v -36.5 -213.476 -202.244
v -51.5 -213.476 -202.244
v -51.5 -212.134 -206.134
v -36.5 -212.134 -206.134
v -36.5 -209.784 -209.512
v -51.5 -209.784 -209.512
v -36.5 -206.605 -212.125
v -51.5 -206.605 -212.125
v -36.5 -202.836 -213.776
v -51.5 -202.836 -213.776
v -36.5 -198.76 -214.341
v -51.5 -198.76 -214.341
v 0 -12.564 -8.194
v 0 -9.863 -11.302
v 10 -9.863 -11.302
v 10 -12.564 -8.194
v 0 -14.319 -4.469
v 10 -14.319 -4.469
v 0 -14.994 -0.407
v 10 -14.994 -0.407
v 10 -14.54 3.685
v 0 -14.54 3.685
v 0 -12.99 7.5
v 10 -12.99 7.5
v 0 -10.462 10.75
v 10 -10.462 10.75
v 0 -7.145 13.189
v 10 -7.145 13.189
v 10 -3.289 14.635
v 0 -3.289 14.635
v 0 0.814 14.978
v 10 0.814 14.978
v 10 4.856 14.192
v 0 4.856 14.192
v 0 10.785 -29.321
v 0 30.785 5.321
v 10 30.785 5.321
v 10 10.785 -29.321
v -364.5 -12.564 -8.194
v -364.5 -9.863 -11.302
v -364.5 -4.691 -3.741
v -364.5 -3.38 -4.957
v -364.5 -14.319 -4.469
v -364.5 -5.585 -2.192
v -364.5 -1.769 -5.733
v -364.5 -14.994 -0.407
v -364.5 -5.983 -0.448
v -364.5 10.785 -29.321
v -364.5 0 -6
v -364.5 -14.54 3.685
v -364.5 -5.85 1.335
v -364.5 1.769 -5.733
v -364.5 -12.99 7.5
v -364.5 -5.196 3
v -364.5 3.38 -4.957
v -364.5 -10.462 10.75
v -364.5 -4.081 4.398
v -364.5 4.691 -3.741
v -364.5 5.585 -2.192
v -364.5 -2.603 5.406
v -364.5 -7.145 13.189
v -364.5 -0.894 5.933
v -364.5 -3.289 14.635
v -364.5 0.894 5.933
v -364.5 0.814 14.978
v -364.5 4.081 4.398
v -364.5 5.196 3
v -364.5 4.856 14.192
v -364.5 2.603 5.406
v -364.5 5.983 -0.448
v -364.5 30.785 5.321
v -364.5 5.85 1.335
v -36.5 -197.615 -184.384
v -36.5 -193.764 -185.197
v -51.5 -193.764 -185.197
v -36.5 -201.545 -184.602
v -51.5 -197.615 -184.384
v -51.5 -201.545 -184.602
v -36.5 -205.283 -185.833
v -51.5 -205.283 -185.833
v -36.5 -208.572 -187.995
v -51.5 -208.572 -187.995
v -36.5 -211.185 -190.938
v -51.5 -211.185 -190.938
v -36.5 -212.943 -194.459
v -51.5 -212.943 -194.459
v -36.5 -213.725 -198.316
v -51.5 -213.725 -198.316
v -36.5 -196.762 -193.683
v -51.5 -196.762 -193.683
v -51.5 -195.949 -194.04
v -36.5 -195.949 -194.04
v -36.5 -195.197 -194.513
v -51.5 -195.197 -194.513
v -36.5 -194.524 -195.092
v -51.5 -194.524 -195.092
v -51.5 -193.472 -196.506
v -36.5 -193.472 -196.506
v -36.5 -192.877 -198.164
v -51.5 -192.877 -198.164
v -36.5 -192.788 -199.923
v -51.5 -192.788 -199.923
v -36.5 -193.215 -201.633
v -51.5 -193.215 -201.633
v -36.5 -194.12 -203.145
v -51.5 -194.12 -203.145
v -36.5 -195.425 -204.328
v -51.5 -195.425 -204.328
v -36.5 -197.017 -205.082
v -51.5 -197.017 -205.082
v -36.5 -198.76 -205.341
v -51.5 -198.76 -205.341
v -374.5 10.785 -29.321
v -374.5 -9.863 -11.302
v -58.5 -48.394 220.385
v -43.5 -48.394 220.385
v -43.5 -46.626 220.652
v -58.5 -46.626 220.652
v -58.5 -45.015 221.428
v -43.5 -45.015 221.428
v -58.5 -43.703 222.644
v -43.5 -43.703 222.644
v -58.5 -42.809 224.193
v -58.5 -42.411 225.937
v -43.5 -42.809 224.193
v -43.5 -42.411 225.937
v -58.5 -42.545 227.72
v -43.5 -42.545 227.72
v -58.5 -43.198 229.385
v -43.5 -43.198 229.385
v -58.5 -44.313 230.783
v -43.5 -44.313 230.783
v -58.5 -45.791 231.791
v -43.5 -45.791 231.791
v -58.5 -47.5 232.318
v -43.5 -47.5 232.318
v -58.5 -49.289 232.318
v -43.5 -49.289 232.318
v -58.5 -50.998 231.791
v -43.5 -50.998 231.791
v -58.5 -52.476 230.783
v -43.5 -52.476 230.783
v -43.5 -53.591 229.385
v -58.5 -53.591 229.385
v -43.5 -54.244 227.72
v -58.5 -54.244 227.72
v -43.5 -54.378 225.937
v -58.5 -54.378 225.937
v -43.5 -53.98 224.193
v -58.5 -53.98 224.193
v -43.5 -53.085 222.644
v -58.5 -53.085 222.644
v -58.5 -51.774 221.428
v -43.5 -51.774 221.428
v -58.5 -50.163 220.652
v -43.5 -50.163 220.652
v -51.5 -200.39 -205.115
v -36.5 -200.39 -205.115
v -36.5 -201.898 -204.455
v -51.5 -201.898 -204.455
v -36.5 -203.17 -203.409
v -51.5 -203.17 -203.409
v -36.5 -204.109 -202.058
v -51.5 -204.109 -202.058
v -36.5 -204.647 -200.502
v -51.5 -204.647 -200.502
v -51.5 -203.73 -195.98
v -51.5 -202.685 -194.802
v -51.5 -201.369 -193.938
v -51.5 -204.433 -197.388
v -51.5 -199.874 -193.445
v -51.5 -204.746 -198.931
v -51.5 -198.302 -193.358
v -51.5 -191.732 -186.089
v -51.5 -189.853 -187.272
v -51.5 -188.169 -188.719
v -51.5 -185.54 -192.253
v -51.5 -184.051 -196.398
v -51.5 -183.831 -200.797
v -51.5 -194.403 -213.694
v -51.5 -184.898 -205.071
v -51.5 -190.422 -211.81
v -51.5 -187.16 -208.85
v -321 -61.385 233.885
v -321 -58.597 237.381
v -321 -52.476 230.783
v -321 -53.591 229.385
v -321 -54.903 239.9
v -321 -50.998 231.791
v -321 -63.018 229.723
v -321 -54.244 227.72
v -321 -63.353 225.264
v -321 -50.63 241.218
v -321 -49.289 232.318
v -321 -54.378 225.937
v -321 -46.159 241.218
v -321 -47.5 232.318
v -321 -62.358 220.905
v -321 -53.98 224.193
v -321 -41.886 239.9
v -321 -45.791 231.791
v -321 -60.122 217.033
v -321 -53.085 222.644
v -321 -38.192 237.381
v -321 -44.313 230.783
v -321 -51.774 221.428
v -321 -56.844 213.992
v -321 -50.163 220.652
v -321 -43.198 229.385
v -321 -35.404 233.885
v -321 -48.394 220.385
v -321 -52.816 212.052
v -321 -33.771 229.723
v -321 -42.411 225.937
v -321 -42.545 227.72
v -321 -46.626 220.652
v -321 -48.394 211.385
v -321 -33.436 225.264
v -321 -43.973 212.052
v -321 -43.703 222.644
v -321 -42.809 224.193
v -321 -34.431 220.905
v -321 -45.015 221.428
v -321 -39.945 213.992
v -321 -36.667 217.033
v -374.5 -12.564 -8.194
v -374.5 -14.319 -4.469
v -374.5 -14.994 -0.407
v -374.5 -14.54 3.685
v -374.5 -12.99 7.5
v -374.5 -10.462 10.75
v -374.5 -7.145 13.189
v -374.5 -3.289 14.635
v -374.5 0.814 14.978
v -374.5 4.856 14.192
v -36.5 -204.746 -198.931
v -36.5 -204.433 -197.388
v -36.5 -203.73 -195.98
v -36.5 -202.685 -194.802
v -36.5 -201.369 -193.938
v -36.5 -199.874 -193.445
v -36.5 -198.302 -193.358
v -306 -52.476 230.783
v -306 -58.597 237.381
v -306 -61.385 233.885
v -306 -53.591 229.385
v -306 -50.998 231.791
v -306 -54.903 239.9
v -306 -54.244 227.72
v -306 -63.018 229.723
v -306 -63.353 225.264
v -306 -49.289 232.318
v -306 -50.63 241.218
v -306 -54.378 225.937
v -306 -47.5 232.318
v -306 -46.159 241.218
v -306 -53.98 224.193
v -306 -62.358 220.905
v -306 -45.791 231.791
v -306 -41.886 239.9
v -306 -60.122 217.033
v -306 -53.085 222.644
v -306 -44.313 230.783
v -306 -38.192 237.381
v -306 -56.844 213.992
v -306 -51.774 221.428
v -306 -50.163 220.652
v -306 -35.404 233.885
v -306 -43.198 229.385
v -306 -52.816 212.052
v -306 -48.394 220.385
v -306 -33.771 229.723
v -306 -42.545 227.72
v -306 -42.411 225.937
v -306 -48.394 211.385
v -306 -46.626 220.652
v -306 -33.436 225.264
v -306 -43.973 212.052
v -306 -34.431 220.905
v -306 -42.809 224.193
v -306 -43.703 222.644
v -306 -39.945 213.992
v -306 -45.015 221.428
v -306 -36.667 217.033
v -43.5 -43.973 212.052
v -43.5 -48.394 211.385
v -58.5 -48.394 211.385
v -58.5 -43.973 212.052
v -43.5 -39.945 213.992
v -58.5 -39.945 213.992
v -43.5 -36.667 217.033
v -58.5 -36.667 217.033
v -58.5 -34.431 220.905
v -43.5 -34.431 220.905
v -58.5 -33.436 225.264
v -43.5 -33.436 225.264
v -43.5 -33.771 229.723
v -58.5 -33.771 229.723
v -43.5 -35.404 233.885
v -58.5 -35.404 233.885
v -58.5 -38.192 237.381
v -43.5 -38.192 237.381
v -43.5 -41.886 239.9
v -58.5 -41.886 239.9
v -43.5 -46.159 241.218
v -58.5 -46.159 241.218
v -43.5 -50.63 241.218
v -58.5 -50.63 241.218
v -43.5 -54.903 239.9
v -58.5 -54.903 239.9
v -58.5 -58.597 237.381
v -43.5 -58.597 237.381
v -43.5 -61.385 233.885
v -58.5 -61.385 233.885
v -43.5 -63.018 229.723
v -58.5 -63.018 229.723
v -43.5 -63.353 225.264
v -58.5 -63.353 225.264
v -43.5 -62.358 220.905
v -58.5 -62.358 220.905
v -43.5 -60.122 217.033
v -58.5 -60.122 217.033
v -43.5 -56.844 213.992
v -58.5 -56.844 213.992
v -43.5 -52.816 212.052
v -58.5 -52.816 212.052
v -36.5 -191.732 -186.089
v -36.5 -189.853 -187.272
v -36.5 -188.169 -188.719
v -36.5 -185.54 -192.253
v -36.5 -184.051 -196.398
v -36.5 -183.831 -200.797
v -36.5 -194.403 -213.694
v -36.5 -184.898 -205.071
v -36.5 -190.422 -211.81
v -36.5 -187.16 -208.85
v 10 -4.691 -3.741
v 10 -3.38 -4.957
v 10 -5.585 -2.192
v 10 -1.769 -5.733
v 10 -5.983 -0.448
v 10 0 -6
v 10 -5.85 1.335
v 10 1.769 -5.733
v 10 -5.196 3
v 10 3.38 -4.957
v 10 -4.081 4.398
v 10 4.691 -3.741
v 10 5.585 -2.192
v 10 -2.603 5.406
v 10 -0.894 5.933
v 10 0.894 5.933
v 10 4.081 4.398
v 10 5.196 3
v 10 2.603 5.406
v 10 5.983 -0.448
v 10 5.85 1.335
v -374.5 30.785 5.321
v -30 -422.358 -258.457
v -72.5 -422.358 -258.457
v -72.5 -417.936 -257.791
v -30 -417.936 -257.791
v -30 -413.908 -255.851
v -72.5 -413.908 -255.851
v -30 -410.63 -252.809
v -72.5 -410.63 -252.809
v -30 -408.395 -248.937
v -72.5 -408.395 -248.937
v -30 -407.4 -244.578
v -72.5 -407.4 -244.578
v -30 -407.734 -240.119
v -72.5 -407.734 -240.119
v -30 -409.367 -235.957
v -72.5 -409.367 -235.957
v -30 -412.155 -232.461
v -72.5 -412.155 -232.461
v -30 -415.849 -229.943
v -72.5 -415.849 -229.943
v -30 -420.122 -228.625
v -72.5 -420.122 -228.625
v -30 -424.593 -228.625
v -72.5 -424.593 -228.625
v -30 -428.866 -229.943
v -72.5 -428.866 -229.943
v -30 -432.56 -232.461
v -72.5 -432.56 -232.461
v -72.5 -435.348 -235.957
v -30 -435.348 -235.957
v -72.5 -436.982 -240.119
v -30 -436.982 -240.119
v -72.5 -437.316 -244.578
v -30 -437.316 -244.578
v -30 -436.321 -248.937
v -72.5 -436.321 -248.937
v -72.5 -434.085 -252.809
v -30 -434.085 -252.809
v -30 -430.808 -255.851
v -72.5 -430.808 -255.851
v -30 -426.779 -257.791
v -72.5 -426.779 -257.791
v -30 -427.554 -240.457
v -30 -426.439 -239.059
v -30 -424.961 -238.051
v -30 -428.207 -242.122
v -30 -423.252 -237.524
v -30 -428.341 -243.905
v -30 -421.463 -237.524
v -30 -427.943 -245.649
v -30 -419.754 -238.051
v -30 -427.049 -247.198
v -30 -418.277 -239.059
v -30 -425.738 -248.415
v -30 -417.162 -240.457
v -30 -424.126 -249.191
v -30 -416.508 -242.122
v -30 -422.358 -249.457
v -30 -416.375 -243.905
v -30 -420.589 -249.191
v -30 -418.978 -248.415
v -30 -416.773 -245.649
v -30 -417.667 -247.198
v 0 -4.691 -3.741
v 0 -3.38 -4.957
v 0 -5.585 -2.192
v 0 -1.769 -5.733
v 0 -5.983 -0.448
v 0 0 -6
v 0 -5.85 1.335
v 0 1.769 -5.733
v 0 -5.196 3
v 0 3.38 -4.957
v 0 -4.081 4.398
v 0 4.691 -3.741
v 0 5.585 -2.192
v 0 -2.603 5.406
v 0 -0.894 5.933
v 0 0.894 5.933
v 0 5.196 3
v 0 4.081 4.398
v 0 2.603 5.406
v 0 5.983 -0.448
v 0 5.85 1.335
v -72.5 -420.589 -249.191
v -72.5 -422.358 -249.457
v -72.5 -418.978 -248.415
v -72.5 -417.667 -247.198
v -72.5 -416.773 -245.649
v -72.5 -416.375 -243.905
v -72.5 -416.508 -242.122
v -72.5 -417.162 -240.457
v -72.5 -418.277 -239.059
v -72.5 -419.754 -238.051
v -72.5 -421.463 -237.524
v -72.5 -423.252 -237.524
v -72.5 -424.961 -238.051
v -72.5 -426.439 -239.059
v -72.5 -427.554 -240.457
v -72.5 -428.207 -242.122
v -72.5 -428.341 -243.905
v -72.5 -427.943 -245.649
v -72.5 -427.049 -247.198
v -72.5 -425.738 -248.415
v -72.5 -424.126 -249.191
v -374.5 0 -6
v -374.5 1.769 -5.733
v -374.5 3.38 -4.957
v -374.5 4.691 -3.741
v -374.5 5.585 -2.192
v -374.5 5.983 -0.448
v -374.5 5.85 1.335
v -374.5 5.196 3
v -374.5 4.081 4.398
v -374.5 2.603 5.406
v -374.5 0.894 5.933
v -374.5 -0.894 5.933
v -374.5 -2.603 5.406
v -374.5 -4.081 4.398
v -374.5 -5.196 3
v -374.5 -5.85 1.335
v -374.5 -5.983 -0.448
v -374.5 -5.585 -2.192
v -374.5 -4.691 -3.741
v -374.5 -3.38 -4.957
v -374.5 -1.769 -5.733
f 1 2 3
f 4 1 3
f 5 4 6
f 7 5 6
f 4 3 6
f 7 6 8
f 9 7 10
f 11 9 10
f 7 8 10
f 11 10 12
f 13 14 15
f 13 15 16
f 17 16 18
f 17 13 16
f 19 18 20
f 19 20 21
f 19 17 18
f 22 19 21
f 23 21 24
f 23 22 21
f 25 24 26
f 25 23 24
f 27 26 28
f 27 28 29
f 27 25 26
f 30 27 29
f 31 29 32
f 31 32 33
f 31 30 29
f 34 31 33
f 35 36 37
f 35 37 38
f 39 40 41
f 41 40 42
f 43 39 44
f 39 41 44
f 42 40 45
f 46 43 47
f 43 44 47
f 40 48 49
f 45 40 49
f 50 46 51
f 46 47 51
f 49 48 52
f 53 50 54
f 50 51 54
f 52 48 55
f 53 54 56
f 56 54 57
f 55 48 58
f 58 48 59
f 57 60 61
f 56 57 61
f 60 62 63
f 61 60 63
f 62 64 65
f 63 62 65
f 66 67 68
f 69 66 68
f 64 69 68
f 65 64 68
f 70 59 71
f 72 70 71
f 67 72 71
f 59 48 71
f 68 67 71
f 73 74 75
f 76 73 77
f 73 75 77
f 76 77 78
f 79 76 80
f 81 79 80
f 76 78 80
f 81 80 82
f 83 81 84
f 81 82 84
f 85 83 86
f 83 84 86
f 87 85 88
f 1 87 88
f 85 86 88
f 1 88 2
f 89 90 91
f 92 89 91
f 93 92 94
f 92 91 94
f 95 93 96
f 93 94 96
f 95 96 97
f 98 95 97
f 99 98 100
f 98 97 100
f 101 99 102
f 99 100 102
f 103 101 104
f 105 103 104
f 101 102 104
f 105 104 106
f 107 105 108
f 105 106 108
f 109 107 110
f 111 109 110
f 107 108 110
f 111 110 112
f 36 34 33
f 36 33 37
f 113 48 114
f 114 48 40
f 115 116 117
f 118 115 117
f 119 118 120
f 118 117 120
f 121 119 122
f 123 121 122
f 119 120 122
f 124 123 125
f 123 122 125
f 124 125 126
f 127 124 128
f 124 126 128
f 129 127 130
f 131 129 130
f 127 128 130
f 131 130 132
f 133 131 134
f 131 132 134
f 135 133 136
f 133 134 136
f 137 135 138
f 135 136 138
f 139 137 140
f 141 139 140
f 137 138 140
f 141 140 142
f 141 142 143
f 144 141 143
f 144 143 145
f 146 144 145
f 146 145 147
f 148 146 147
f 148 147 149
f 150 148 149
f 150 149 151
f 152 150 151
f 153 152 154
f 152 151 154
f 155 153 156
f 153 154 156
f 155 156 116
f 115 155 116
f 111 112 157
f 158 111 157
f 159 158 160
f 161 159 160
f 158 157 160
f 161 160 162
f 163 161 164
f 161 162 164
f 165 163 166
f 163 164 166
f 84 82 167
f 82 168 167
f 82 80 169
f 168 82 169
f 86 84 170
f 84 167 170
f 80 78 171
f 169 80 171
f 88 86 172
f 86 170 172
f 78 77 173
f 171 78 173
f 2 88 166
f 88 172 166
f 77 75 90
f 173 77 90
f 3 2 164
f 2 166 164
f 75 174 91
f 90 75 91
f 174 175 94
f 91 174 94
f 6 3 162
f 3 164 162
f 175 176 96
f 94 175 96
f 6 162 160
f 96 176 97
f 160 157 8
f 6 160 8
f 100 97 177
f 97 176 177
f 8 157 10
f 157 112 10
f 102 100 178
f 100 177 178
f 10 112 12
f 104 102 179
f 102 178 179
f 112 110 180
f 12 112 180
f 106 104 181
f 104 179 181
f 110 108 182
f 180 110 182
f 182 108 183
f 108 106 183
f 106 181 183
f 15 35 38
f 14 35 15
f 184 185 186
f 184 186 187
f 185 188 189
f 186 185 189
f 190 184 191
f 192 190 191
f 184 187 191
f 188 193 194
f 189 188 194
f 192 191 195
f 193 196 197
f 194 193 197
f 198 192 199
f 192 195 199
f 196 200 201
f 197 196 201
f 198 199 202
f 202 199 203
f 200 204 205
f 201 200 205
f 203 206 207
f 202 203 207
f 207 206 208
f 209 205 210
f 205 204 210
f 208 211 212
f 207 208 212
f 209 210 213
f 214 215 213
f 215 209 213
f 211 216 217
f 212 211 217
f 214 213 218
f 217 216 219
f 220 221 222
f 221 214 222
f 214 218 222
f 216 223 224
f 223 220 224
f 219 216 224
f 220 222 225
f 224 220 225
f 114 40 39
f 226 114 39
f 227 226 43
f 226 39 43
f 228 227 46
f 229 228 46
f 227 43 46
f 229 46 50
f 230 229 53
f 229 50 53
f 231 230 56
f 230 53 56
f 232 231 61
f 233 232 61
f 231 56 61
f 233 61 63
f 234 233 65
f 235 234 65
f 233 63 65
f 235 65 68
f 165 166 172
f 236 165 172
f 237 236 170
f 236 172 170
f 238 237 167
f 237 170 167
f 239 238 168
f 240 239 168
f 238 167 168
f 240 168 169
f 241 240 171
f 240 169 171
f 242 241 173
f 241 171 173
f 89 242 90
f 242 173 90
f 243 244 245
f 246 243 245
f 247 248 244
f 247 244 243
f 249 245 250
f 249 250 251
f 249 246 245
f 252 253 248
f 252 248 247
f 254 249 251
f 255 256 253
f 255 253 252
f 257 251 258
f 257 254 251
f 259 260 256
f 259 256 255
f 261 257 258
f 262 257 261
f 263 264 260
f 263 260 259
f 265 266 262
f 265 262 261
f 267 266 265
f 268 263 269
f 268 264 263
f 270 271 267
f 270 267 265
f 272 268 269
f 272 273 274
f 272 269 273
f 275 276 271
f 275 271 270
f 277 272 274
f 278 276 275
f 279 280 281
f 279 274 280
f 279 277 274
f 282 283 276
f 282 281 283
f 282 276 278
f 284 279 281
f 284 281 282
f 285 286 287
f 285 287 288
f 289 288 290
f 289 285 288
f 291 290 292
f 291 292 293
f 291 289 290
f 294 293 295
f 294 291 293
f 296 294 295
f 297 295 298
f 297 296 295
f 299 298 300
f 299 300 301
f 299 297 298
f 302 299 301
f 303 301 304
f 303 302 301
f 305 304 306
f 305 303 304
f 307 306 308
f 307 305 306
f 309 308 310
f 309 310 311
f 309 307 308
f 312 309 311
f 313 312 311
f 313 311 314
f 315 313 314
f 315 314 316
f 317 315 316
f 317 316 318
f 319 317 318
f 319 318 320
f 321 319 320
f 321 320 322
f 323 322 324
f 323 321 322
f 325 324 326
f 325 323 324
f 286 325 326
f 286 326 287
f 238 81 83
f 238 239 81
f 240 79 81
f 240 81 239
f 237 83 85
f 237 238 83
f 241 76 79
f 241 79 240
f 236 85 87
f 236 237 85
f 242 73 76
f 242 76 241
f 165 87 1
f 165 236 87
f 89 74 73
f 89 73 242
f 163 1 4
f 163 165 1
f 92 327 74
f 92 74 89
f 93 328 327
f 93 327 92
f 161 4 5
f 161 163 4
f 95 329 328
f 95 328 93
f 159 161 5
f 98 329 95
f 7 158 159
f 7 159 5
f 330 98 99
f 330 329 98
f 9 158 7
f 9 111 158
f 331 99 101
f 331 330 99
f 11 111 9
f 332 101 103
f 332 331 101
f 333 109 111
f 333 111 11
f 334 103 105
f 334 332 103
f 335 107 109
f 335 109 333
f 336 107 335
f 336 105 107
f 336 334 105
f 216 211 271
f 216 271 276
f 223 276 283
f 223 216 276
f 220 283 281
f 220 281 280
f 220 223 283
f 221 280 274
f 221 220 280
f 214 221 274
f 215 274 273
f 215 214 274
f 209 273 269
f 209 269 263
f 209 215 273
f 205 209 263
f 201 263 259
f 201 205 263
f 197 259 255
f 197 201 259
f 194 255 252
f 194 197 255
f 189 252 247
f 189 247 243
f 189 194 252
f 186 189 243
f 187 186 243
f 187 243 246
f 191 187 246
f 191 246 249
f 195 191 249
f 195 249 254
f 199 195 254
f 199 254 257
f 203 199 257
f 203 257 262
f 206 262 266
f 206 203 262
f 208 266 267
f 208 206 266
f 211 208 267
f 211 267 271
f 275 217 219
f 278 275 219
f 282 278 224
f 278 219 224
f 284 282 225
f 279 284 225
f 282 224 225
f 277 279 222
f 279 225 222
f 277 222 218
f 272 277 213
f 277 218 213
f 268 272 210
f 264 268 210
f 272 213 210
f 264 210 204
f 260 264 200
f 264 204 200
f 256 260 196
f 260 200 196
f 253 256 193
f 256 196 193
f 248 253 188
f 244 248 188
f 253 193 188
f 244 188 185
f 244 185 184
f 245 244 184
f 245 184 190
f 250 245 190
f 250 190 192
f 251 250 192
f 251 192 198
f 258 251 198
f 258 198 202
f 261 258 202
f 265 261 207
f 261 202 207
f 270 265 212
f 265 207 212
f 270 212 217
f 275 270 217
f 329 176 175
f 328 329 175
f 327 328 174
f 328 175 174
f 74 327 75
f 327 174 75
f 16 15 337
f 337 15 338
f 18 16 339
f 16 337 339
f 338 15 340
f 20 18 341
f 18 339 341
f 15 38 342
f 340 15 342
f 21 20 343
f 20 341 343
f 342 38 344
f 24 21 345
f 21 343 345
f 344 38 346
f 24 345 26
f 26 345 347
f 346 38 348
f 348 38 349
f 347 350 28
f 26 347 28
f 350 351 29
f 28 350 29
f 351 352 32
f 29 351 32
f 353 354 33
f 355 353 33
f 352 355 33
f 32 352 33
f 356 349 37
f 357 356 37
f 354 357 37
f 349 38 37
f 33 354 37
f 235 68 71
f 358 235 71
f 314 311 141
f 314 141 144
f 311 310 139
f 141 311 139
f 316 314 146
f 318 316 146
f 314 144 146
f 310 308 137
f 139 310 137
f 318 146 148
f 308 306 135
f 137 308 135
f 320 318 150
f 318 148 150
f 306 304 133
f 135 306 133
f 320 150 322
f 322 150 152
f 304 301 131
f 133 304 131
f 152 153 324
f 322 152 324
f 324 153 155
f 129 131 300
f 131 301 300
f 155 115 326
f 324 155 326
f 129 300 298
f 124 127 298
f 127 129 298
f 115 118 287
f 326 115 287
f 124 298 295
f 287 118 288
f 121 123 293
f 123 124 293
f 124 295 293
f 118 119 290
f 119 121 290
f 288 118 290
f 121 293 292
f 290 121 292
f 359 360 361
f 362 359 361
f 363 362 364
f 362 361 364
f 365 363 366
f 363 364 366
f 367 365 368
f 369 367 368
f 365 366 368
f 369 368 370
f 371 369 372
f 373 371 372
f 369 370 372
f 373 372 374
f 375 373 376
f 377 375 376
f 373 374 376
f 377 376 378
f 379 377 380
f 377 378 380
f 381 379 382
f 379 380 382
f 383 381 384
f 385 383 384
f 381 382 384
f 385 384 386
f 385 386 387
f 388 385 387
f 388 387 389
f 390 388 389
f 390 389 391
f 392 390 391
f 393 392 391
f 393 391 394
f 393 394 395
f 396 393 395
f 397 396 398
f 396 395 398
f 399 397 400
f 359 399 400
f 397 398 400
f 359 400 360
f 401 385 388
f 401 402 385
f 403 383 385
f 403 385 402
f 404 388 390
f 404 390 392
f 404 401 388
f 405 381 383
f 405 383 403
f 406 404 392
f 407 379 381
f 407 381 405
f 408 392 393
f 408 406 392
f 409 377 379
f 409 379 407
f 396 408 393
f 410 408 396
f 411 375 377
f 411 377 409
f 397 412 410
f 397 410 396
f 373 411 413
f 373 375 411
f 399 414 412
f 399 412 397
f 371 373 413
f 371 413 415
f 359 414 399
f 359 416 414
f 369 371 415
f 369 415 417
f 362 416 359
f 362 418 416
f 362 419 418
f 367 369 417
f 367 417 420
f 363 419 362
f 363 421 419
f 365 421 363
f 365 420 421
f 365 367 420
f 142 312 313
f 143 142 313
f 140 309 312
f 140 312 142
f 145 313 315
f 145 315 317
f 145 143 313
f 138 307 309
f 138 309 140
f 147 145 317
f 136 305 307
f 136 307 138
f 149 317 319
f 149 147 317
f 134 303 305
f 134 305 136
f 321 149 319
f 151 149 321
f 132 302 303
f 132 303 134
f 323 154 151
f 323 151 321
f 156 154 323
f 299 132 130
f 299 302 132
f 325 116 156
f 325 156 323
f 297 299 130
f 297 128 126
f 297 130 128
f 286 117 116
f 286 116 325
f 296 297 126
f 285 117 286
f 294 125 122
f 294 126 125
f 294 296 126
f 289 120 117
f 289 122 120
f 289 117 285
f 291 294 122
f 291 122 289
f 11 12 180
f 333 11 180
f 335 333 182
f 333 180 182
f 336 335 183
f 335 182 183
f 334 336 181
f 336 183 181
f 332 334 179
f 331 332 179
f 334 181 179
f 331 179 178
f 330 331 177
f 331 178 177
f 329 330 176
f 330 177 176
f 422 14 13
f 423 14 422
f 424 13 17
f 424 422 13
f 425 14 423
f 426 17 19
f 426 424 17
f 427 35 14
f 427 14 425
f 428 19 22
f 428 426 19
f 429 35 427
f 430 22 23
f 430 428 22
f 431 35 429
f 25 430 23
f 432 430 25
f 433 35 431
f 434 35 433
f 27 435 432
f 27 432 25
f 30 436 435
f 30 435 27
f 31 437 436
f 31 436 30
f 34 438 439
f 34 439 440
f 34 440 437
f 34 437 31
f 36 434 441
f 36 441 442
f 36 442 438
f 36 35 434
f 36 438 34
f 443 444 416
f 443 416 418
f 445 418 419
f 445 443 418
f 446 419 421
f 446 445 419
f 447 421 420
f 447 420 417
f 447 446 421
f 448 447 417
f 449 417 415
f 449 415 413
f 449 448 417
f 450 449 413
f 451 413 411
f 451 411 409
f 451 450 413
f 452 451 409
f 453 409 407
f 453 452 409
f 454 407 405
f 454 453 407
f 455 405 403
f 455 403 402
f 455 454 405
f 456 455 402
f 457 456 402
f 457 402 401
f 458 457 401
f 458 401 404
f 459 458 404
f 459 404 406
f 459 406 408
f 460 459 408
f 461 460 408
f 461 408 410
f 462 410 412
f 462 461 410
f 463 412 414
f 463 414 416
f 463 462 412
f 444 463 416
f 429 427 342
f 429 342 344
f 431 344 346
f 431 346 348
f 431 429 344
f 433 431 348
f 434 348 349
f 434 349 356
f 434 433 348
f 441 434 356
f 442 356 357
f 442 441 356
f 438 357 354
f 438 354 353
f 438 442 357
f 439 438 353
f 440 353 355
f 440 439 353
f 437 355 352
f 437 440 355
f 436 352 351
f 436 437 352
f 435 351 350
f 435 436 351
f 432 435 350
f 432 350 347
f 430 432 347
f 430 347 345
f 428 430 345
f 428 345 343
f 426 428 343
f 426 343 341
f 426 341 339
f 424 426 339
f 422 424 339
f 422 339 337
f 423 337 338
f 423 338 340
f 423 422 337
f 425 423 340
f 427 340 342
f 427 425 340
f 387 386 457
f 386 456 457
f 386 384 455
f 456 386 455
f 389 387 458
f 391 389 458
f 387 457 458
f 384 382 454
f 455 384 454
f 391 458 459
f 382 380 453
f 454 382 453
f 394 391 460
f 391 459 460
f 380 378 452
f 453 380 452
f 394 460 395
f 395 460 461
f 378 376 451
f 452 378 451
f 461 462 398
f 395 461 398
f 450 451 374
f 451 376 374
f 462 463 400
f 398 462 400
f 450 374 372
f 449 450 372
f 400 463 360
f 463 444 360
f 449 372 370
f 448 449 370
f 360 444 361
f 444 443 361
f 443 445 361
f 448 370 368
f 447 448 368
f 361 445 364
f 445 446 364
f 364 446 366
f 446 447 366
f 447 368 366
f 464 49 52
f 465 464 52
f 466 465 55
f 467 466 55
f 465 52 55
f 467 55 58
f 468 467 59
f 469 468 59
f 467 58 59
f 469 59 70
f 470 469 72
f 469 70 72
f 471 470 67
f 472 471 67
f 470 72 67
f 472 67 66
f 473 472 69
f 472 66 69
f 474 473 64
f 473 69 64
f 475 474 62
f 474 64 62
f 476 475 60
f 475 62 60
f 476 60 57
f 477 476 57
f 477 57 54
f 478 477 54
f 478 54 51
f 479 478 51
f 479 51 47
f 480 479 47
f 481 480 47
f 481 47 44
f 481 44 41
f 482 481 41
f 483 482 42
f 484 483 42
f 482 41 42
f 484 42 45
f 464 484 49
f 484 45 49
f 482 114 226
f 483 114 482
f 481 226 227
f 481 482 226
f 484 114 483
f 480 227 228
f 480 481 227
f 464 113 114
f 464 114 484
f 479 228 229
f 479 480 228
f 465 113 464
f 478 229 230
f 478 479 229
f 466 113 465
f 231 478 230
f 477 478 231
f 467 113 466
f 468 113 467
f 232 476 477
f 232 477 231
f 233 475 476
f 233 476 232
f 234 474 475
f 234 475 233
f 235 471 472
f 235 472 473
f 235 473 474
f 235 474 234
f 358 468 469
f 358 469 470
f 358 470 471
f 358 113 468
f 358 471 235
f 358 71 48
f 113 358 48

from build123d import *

# Parameters (mm, degrees)
SKETCH2_R           = 6
BOSS_EXTRUDE1_DEPTH = 10
SKETCH3_R           = 15
SKETCH3_R_2         = 6
BOSS_EXTRUDE2_DEPTH = 15
SKETCH5_R           = 15
SKETCH5_R_2         = 6
BOSS_EXTRUDE3_DEPTH = 42.5
BOSS_EXTRUDE4_DEPTH = 15


with BuildPart() as part:
    # Sketch2 → Boss-Extrude1 (new body)
    with BuildSketch(Plane(origin=(0, 0, 0), x_dir=(0, 0, -1), z_dir=(1, 0, 0))):
        with BuildLine():
            Line((-5.320508076, 30.784609691), (29.320508076, 10.784609691))
            Line((29.320508076, 10.784609691), (11.301534141, -9.862825461))
            ThreePointArc((11.301534141, -9.862825461), (-7.5, -12.990381057), (-14.192224472, 4.856002937))
            Line((-14.192224472, 4.856002937), (-5.320508076, 30.784609691))
        make_face()
        Circle(SKETCH2_R, mode=Mode.SUBTRACT)
    extrude(amount=BOSS_EXTRUDE1_DEPTH)


with BuildPart() as body_2:
    # Sketch3 → Boss-Extrude2 (new body)
    with BuildSketch(Plane(origin=(-43.5, 0, 0), x_dir=(0, 0, -1), z_dir=(1, 0, 0))):
        with Locations((-226.385122131, -48.394488094)):
            Circle(SKETCH3_R)
        with Locations((-226.385122131, -48.394488094)):
            Circle(SKETCH3_R_2, mode=Mode.SUBTRACT)
    extrude(amount=-BOSS_EXTRUDE2_DEPTH)


with BuildPart() as body_3:
    # Sketch5 → Boss-Extrude3 (new body)
    with BuildSketch(Plane(origin=(-72.5, 0, 0), x_dir=(0, 0, -1), z_dir=(1, 0, 0))):
        with Locations((243.45711943, -422.357745708)):
            Circle(SKETCH5_R)
        with Locations((243.45711943, -422.357745708)):
            Circle(SKETCH5_R_2, mode=Mode.SUBTRACT)
    extrude(amount=BOSS_EXTRUDE3_DEPTH)


with BuildPart() as body_4:
    # Sketch7 → Boss-Extrude4 (new body)
    with BuildSketch(Plane(origin=(-51.5, 0, 0), x_dir=(0, 0, -1), z_dir=(1, 0, 0))):
        with BuildLine():
            Line((193.683194113, -196.761801503), (185.196965502, -193.76448204))
            ThreePointArc((185.196965502, -193.76448204), (187.995008135, -208.572034313), (202.24424464, -213.476308561))
            Line((202.24424464, -213.476308561), (200.502105768, -204.646532111))
            ThreePointArc((200.502105768, -204.646532111), (194.802411166, -202.684822412), (193.683194113, -196.761801503))
        make_face()
        with BuildLine():
            ThreePointArc((214.340679854, -198.760014478), (205.070823115, -184.897638845), (188.71861876, -188.168894701))
            Line((188.71861876, -188.168894701), (195.091855416, -194.523566568))
            ThreePointArc((195.091855416, -194.523566568), (201.632737158, -193.215064225), (205.340679854, -198.760014478))
            ThreePointArc((205.340679854, -198.760014478), (203.975793417, -202.569964905), (200.502105768, -204.646532111))
            Line((200.502105768, -204.646532111), (202.24424464, -213.476308561))
            ThreePointArc((202.24424464, -213.476308561), (210.928463762, -208.284890546), (214.340679854, -198.760014478))
        make_face()
        with BuildLine():
            ThreePointArc((188.71861876, -188.168894701), (186.645658871, -190.770243378), (185.196965502, -193.76448204))
            Line((185.196965502, -193.76448204), (193.683194113, -196.761801503))
            ThreePointArc((193.683194113, -196.761801503), (194.26267146, -195.564106038), (195.091855416, -194.523566568))
            Line((195.091855416, -194.523566568), (188.71861876, -188.168894701))
        make_face()
    extrude(amount=BOSS_EXTRUDE4_DEPTH)


with BuildPart() as body_5:
    # Mirror5: mirrored copy
    add(body_2.part.mirror(Plane.ZY.offset(182.25)))


with BuildPart() as body_6:
    # Mirror5 2: mirrored copy
    add(part.part.mirror(Plane.ZY.offset(182.25)))


solid = Compound([part.part, body_2.part, body_3.part, body_4.part, body_5.part, body_6.part])
